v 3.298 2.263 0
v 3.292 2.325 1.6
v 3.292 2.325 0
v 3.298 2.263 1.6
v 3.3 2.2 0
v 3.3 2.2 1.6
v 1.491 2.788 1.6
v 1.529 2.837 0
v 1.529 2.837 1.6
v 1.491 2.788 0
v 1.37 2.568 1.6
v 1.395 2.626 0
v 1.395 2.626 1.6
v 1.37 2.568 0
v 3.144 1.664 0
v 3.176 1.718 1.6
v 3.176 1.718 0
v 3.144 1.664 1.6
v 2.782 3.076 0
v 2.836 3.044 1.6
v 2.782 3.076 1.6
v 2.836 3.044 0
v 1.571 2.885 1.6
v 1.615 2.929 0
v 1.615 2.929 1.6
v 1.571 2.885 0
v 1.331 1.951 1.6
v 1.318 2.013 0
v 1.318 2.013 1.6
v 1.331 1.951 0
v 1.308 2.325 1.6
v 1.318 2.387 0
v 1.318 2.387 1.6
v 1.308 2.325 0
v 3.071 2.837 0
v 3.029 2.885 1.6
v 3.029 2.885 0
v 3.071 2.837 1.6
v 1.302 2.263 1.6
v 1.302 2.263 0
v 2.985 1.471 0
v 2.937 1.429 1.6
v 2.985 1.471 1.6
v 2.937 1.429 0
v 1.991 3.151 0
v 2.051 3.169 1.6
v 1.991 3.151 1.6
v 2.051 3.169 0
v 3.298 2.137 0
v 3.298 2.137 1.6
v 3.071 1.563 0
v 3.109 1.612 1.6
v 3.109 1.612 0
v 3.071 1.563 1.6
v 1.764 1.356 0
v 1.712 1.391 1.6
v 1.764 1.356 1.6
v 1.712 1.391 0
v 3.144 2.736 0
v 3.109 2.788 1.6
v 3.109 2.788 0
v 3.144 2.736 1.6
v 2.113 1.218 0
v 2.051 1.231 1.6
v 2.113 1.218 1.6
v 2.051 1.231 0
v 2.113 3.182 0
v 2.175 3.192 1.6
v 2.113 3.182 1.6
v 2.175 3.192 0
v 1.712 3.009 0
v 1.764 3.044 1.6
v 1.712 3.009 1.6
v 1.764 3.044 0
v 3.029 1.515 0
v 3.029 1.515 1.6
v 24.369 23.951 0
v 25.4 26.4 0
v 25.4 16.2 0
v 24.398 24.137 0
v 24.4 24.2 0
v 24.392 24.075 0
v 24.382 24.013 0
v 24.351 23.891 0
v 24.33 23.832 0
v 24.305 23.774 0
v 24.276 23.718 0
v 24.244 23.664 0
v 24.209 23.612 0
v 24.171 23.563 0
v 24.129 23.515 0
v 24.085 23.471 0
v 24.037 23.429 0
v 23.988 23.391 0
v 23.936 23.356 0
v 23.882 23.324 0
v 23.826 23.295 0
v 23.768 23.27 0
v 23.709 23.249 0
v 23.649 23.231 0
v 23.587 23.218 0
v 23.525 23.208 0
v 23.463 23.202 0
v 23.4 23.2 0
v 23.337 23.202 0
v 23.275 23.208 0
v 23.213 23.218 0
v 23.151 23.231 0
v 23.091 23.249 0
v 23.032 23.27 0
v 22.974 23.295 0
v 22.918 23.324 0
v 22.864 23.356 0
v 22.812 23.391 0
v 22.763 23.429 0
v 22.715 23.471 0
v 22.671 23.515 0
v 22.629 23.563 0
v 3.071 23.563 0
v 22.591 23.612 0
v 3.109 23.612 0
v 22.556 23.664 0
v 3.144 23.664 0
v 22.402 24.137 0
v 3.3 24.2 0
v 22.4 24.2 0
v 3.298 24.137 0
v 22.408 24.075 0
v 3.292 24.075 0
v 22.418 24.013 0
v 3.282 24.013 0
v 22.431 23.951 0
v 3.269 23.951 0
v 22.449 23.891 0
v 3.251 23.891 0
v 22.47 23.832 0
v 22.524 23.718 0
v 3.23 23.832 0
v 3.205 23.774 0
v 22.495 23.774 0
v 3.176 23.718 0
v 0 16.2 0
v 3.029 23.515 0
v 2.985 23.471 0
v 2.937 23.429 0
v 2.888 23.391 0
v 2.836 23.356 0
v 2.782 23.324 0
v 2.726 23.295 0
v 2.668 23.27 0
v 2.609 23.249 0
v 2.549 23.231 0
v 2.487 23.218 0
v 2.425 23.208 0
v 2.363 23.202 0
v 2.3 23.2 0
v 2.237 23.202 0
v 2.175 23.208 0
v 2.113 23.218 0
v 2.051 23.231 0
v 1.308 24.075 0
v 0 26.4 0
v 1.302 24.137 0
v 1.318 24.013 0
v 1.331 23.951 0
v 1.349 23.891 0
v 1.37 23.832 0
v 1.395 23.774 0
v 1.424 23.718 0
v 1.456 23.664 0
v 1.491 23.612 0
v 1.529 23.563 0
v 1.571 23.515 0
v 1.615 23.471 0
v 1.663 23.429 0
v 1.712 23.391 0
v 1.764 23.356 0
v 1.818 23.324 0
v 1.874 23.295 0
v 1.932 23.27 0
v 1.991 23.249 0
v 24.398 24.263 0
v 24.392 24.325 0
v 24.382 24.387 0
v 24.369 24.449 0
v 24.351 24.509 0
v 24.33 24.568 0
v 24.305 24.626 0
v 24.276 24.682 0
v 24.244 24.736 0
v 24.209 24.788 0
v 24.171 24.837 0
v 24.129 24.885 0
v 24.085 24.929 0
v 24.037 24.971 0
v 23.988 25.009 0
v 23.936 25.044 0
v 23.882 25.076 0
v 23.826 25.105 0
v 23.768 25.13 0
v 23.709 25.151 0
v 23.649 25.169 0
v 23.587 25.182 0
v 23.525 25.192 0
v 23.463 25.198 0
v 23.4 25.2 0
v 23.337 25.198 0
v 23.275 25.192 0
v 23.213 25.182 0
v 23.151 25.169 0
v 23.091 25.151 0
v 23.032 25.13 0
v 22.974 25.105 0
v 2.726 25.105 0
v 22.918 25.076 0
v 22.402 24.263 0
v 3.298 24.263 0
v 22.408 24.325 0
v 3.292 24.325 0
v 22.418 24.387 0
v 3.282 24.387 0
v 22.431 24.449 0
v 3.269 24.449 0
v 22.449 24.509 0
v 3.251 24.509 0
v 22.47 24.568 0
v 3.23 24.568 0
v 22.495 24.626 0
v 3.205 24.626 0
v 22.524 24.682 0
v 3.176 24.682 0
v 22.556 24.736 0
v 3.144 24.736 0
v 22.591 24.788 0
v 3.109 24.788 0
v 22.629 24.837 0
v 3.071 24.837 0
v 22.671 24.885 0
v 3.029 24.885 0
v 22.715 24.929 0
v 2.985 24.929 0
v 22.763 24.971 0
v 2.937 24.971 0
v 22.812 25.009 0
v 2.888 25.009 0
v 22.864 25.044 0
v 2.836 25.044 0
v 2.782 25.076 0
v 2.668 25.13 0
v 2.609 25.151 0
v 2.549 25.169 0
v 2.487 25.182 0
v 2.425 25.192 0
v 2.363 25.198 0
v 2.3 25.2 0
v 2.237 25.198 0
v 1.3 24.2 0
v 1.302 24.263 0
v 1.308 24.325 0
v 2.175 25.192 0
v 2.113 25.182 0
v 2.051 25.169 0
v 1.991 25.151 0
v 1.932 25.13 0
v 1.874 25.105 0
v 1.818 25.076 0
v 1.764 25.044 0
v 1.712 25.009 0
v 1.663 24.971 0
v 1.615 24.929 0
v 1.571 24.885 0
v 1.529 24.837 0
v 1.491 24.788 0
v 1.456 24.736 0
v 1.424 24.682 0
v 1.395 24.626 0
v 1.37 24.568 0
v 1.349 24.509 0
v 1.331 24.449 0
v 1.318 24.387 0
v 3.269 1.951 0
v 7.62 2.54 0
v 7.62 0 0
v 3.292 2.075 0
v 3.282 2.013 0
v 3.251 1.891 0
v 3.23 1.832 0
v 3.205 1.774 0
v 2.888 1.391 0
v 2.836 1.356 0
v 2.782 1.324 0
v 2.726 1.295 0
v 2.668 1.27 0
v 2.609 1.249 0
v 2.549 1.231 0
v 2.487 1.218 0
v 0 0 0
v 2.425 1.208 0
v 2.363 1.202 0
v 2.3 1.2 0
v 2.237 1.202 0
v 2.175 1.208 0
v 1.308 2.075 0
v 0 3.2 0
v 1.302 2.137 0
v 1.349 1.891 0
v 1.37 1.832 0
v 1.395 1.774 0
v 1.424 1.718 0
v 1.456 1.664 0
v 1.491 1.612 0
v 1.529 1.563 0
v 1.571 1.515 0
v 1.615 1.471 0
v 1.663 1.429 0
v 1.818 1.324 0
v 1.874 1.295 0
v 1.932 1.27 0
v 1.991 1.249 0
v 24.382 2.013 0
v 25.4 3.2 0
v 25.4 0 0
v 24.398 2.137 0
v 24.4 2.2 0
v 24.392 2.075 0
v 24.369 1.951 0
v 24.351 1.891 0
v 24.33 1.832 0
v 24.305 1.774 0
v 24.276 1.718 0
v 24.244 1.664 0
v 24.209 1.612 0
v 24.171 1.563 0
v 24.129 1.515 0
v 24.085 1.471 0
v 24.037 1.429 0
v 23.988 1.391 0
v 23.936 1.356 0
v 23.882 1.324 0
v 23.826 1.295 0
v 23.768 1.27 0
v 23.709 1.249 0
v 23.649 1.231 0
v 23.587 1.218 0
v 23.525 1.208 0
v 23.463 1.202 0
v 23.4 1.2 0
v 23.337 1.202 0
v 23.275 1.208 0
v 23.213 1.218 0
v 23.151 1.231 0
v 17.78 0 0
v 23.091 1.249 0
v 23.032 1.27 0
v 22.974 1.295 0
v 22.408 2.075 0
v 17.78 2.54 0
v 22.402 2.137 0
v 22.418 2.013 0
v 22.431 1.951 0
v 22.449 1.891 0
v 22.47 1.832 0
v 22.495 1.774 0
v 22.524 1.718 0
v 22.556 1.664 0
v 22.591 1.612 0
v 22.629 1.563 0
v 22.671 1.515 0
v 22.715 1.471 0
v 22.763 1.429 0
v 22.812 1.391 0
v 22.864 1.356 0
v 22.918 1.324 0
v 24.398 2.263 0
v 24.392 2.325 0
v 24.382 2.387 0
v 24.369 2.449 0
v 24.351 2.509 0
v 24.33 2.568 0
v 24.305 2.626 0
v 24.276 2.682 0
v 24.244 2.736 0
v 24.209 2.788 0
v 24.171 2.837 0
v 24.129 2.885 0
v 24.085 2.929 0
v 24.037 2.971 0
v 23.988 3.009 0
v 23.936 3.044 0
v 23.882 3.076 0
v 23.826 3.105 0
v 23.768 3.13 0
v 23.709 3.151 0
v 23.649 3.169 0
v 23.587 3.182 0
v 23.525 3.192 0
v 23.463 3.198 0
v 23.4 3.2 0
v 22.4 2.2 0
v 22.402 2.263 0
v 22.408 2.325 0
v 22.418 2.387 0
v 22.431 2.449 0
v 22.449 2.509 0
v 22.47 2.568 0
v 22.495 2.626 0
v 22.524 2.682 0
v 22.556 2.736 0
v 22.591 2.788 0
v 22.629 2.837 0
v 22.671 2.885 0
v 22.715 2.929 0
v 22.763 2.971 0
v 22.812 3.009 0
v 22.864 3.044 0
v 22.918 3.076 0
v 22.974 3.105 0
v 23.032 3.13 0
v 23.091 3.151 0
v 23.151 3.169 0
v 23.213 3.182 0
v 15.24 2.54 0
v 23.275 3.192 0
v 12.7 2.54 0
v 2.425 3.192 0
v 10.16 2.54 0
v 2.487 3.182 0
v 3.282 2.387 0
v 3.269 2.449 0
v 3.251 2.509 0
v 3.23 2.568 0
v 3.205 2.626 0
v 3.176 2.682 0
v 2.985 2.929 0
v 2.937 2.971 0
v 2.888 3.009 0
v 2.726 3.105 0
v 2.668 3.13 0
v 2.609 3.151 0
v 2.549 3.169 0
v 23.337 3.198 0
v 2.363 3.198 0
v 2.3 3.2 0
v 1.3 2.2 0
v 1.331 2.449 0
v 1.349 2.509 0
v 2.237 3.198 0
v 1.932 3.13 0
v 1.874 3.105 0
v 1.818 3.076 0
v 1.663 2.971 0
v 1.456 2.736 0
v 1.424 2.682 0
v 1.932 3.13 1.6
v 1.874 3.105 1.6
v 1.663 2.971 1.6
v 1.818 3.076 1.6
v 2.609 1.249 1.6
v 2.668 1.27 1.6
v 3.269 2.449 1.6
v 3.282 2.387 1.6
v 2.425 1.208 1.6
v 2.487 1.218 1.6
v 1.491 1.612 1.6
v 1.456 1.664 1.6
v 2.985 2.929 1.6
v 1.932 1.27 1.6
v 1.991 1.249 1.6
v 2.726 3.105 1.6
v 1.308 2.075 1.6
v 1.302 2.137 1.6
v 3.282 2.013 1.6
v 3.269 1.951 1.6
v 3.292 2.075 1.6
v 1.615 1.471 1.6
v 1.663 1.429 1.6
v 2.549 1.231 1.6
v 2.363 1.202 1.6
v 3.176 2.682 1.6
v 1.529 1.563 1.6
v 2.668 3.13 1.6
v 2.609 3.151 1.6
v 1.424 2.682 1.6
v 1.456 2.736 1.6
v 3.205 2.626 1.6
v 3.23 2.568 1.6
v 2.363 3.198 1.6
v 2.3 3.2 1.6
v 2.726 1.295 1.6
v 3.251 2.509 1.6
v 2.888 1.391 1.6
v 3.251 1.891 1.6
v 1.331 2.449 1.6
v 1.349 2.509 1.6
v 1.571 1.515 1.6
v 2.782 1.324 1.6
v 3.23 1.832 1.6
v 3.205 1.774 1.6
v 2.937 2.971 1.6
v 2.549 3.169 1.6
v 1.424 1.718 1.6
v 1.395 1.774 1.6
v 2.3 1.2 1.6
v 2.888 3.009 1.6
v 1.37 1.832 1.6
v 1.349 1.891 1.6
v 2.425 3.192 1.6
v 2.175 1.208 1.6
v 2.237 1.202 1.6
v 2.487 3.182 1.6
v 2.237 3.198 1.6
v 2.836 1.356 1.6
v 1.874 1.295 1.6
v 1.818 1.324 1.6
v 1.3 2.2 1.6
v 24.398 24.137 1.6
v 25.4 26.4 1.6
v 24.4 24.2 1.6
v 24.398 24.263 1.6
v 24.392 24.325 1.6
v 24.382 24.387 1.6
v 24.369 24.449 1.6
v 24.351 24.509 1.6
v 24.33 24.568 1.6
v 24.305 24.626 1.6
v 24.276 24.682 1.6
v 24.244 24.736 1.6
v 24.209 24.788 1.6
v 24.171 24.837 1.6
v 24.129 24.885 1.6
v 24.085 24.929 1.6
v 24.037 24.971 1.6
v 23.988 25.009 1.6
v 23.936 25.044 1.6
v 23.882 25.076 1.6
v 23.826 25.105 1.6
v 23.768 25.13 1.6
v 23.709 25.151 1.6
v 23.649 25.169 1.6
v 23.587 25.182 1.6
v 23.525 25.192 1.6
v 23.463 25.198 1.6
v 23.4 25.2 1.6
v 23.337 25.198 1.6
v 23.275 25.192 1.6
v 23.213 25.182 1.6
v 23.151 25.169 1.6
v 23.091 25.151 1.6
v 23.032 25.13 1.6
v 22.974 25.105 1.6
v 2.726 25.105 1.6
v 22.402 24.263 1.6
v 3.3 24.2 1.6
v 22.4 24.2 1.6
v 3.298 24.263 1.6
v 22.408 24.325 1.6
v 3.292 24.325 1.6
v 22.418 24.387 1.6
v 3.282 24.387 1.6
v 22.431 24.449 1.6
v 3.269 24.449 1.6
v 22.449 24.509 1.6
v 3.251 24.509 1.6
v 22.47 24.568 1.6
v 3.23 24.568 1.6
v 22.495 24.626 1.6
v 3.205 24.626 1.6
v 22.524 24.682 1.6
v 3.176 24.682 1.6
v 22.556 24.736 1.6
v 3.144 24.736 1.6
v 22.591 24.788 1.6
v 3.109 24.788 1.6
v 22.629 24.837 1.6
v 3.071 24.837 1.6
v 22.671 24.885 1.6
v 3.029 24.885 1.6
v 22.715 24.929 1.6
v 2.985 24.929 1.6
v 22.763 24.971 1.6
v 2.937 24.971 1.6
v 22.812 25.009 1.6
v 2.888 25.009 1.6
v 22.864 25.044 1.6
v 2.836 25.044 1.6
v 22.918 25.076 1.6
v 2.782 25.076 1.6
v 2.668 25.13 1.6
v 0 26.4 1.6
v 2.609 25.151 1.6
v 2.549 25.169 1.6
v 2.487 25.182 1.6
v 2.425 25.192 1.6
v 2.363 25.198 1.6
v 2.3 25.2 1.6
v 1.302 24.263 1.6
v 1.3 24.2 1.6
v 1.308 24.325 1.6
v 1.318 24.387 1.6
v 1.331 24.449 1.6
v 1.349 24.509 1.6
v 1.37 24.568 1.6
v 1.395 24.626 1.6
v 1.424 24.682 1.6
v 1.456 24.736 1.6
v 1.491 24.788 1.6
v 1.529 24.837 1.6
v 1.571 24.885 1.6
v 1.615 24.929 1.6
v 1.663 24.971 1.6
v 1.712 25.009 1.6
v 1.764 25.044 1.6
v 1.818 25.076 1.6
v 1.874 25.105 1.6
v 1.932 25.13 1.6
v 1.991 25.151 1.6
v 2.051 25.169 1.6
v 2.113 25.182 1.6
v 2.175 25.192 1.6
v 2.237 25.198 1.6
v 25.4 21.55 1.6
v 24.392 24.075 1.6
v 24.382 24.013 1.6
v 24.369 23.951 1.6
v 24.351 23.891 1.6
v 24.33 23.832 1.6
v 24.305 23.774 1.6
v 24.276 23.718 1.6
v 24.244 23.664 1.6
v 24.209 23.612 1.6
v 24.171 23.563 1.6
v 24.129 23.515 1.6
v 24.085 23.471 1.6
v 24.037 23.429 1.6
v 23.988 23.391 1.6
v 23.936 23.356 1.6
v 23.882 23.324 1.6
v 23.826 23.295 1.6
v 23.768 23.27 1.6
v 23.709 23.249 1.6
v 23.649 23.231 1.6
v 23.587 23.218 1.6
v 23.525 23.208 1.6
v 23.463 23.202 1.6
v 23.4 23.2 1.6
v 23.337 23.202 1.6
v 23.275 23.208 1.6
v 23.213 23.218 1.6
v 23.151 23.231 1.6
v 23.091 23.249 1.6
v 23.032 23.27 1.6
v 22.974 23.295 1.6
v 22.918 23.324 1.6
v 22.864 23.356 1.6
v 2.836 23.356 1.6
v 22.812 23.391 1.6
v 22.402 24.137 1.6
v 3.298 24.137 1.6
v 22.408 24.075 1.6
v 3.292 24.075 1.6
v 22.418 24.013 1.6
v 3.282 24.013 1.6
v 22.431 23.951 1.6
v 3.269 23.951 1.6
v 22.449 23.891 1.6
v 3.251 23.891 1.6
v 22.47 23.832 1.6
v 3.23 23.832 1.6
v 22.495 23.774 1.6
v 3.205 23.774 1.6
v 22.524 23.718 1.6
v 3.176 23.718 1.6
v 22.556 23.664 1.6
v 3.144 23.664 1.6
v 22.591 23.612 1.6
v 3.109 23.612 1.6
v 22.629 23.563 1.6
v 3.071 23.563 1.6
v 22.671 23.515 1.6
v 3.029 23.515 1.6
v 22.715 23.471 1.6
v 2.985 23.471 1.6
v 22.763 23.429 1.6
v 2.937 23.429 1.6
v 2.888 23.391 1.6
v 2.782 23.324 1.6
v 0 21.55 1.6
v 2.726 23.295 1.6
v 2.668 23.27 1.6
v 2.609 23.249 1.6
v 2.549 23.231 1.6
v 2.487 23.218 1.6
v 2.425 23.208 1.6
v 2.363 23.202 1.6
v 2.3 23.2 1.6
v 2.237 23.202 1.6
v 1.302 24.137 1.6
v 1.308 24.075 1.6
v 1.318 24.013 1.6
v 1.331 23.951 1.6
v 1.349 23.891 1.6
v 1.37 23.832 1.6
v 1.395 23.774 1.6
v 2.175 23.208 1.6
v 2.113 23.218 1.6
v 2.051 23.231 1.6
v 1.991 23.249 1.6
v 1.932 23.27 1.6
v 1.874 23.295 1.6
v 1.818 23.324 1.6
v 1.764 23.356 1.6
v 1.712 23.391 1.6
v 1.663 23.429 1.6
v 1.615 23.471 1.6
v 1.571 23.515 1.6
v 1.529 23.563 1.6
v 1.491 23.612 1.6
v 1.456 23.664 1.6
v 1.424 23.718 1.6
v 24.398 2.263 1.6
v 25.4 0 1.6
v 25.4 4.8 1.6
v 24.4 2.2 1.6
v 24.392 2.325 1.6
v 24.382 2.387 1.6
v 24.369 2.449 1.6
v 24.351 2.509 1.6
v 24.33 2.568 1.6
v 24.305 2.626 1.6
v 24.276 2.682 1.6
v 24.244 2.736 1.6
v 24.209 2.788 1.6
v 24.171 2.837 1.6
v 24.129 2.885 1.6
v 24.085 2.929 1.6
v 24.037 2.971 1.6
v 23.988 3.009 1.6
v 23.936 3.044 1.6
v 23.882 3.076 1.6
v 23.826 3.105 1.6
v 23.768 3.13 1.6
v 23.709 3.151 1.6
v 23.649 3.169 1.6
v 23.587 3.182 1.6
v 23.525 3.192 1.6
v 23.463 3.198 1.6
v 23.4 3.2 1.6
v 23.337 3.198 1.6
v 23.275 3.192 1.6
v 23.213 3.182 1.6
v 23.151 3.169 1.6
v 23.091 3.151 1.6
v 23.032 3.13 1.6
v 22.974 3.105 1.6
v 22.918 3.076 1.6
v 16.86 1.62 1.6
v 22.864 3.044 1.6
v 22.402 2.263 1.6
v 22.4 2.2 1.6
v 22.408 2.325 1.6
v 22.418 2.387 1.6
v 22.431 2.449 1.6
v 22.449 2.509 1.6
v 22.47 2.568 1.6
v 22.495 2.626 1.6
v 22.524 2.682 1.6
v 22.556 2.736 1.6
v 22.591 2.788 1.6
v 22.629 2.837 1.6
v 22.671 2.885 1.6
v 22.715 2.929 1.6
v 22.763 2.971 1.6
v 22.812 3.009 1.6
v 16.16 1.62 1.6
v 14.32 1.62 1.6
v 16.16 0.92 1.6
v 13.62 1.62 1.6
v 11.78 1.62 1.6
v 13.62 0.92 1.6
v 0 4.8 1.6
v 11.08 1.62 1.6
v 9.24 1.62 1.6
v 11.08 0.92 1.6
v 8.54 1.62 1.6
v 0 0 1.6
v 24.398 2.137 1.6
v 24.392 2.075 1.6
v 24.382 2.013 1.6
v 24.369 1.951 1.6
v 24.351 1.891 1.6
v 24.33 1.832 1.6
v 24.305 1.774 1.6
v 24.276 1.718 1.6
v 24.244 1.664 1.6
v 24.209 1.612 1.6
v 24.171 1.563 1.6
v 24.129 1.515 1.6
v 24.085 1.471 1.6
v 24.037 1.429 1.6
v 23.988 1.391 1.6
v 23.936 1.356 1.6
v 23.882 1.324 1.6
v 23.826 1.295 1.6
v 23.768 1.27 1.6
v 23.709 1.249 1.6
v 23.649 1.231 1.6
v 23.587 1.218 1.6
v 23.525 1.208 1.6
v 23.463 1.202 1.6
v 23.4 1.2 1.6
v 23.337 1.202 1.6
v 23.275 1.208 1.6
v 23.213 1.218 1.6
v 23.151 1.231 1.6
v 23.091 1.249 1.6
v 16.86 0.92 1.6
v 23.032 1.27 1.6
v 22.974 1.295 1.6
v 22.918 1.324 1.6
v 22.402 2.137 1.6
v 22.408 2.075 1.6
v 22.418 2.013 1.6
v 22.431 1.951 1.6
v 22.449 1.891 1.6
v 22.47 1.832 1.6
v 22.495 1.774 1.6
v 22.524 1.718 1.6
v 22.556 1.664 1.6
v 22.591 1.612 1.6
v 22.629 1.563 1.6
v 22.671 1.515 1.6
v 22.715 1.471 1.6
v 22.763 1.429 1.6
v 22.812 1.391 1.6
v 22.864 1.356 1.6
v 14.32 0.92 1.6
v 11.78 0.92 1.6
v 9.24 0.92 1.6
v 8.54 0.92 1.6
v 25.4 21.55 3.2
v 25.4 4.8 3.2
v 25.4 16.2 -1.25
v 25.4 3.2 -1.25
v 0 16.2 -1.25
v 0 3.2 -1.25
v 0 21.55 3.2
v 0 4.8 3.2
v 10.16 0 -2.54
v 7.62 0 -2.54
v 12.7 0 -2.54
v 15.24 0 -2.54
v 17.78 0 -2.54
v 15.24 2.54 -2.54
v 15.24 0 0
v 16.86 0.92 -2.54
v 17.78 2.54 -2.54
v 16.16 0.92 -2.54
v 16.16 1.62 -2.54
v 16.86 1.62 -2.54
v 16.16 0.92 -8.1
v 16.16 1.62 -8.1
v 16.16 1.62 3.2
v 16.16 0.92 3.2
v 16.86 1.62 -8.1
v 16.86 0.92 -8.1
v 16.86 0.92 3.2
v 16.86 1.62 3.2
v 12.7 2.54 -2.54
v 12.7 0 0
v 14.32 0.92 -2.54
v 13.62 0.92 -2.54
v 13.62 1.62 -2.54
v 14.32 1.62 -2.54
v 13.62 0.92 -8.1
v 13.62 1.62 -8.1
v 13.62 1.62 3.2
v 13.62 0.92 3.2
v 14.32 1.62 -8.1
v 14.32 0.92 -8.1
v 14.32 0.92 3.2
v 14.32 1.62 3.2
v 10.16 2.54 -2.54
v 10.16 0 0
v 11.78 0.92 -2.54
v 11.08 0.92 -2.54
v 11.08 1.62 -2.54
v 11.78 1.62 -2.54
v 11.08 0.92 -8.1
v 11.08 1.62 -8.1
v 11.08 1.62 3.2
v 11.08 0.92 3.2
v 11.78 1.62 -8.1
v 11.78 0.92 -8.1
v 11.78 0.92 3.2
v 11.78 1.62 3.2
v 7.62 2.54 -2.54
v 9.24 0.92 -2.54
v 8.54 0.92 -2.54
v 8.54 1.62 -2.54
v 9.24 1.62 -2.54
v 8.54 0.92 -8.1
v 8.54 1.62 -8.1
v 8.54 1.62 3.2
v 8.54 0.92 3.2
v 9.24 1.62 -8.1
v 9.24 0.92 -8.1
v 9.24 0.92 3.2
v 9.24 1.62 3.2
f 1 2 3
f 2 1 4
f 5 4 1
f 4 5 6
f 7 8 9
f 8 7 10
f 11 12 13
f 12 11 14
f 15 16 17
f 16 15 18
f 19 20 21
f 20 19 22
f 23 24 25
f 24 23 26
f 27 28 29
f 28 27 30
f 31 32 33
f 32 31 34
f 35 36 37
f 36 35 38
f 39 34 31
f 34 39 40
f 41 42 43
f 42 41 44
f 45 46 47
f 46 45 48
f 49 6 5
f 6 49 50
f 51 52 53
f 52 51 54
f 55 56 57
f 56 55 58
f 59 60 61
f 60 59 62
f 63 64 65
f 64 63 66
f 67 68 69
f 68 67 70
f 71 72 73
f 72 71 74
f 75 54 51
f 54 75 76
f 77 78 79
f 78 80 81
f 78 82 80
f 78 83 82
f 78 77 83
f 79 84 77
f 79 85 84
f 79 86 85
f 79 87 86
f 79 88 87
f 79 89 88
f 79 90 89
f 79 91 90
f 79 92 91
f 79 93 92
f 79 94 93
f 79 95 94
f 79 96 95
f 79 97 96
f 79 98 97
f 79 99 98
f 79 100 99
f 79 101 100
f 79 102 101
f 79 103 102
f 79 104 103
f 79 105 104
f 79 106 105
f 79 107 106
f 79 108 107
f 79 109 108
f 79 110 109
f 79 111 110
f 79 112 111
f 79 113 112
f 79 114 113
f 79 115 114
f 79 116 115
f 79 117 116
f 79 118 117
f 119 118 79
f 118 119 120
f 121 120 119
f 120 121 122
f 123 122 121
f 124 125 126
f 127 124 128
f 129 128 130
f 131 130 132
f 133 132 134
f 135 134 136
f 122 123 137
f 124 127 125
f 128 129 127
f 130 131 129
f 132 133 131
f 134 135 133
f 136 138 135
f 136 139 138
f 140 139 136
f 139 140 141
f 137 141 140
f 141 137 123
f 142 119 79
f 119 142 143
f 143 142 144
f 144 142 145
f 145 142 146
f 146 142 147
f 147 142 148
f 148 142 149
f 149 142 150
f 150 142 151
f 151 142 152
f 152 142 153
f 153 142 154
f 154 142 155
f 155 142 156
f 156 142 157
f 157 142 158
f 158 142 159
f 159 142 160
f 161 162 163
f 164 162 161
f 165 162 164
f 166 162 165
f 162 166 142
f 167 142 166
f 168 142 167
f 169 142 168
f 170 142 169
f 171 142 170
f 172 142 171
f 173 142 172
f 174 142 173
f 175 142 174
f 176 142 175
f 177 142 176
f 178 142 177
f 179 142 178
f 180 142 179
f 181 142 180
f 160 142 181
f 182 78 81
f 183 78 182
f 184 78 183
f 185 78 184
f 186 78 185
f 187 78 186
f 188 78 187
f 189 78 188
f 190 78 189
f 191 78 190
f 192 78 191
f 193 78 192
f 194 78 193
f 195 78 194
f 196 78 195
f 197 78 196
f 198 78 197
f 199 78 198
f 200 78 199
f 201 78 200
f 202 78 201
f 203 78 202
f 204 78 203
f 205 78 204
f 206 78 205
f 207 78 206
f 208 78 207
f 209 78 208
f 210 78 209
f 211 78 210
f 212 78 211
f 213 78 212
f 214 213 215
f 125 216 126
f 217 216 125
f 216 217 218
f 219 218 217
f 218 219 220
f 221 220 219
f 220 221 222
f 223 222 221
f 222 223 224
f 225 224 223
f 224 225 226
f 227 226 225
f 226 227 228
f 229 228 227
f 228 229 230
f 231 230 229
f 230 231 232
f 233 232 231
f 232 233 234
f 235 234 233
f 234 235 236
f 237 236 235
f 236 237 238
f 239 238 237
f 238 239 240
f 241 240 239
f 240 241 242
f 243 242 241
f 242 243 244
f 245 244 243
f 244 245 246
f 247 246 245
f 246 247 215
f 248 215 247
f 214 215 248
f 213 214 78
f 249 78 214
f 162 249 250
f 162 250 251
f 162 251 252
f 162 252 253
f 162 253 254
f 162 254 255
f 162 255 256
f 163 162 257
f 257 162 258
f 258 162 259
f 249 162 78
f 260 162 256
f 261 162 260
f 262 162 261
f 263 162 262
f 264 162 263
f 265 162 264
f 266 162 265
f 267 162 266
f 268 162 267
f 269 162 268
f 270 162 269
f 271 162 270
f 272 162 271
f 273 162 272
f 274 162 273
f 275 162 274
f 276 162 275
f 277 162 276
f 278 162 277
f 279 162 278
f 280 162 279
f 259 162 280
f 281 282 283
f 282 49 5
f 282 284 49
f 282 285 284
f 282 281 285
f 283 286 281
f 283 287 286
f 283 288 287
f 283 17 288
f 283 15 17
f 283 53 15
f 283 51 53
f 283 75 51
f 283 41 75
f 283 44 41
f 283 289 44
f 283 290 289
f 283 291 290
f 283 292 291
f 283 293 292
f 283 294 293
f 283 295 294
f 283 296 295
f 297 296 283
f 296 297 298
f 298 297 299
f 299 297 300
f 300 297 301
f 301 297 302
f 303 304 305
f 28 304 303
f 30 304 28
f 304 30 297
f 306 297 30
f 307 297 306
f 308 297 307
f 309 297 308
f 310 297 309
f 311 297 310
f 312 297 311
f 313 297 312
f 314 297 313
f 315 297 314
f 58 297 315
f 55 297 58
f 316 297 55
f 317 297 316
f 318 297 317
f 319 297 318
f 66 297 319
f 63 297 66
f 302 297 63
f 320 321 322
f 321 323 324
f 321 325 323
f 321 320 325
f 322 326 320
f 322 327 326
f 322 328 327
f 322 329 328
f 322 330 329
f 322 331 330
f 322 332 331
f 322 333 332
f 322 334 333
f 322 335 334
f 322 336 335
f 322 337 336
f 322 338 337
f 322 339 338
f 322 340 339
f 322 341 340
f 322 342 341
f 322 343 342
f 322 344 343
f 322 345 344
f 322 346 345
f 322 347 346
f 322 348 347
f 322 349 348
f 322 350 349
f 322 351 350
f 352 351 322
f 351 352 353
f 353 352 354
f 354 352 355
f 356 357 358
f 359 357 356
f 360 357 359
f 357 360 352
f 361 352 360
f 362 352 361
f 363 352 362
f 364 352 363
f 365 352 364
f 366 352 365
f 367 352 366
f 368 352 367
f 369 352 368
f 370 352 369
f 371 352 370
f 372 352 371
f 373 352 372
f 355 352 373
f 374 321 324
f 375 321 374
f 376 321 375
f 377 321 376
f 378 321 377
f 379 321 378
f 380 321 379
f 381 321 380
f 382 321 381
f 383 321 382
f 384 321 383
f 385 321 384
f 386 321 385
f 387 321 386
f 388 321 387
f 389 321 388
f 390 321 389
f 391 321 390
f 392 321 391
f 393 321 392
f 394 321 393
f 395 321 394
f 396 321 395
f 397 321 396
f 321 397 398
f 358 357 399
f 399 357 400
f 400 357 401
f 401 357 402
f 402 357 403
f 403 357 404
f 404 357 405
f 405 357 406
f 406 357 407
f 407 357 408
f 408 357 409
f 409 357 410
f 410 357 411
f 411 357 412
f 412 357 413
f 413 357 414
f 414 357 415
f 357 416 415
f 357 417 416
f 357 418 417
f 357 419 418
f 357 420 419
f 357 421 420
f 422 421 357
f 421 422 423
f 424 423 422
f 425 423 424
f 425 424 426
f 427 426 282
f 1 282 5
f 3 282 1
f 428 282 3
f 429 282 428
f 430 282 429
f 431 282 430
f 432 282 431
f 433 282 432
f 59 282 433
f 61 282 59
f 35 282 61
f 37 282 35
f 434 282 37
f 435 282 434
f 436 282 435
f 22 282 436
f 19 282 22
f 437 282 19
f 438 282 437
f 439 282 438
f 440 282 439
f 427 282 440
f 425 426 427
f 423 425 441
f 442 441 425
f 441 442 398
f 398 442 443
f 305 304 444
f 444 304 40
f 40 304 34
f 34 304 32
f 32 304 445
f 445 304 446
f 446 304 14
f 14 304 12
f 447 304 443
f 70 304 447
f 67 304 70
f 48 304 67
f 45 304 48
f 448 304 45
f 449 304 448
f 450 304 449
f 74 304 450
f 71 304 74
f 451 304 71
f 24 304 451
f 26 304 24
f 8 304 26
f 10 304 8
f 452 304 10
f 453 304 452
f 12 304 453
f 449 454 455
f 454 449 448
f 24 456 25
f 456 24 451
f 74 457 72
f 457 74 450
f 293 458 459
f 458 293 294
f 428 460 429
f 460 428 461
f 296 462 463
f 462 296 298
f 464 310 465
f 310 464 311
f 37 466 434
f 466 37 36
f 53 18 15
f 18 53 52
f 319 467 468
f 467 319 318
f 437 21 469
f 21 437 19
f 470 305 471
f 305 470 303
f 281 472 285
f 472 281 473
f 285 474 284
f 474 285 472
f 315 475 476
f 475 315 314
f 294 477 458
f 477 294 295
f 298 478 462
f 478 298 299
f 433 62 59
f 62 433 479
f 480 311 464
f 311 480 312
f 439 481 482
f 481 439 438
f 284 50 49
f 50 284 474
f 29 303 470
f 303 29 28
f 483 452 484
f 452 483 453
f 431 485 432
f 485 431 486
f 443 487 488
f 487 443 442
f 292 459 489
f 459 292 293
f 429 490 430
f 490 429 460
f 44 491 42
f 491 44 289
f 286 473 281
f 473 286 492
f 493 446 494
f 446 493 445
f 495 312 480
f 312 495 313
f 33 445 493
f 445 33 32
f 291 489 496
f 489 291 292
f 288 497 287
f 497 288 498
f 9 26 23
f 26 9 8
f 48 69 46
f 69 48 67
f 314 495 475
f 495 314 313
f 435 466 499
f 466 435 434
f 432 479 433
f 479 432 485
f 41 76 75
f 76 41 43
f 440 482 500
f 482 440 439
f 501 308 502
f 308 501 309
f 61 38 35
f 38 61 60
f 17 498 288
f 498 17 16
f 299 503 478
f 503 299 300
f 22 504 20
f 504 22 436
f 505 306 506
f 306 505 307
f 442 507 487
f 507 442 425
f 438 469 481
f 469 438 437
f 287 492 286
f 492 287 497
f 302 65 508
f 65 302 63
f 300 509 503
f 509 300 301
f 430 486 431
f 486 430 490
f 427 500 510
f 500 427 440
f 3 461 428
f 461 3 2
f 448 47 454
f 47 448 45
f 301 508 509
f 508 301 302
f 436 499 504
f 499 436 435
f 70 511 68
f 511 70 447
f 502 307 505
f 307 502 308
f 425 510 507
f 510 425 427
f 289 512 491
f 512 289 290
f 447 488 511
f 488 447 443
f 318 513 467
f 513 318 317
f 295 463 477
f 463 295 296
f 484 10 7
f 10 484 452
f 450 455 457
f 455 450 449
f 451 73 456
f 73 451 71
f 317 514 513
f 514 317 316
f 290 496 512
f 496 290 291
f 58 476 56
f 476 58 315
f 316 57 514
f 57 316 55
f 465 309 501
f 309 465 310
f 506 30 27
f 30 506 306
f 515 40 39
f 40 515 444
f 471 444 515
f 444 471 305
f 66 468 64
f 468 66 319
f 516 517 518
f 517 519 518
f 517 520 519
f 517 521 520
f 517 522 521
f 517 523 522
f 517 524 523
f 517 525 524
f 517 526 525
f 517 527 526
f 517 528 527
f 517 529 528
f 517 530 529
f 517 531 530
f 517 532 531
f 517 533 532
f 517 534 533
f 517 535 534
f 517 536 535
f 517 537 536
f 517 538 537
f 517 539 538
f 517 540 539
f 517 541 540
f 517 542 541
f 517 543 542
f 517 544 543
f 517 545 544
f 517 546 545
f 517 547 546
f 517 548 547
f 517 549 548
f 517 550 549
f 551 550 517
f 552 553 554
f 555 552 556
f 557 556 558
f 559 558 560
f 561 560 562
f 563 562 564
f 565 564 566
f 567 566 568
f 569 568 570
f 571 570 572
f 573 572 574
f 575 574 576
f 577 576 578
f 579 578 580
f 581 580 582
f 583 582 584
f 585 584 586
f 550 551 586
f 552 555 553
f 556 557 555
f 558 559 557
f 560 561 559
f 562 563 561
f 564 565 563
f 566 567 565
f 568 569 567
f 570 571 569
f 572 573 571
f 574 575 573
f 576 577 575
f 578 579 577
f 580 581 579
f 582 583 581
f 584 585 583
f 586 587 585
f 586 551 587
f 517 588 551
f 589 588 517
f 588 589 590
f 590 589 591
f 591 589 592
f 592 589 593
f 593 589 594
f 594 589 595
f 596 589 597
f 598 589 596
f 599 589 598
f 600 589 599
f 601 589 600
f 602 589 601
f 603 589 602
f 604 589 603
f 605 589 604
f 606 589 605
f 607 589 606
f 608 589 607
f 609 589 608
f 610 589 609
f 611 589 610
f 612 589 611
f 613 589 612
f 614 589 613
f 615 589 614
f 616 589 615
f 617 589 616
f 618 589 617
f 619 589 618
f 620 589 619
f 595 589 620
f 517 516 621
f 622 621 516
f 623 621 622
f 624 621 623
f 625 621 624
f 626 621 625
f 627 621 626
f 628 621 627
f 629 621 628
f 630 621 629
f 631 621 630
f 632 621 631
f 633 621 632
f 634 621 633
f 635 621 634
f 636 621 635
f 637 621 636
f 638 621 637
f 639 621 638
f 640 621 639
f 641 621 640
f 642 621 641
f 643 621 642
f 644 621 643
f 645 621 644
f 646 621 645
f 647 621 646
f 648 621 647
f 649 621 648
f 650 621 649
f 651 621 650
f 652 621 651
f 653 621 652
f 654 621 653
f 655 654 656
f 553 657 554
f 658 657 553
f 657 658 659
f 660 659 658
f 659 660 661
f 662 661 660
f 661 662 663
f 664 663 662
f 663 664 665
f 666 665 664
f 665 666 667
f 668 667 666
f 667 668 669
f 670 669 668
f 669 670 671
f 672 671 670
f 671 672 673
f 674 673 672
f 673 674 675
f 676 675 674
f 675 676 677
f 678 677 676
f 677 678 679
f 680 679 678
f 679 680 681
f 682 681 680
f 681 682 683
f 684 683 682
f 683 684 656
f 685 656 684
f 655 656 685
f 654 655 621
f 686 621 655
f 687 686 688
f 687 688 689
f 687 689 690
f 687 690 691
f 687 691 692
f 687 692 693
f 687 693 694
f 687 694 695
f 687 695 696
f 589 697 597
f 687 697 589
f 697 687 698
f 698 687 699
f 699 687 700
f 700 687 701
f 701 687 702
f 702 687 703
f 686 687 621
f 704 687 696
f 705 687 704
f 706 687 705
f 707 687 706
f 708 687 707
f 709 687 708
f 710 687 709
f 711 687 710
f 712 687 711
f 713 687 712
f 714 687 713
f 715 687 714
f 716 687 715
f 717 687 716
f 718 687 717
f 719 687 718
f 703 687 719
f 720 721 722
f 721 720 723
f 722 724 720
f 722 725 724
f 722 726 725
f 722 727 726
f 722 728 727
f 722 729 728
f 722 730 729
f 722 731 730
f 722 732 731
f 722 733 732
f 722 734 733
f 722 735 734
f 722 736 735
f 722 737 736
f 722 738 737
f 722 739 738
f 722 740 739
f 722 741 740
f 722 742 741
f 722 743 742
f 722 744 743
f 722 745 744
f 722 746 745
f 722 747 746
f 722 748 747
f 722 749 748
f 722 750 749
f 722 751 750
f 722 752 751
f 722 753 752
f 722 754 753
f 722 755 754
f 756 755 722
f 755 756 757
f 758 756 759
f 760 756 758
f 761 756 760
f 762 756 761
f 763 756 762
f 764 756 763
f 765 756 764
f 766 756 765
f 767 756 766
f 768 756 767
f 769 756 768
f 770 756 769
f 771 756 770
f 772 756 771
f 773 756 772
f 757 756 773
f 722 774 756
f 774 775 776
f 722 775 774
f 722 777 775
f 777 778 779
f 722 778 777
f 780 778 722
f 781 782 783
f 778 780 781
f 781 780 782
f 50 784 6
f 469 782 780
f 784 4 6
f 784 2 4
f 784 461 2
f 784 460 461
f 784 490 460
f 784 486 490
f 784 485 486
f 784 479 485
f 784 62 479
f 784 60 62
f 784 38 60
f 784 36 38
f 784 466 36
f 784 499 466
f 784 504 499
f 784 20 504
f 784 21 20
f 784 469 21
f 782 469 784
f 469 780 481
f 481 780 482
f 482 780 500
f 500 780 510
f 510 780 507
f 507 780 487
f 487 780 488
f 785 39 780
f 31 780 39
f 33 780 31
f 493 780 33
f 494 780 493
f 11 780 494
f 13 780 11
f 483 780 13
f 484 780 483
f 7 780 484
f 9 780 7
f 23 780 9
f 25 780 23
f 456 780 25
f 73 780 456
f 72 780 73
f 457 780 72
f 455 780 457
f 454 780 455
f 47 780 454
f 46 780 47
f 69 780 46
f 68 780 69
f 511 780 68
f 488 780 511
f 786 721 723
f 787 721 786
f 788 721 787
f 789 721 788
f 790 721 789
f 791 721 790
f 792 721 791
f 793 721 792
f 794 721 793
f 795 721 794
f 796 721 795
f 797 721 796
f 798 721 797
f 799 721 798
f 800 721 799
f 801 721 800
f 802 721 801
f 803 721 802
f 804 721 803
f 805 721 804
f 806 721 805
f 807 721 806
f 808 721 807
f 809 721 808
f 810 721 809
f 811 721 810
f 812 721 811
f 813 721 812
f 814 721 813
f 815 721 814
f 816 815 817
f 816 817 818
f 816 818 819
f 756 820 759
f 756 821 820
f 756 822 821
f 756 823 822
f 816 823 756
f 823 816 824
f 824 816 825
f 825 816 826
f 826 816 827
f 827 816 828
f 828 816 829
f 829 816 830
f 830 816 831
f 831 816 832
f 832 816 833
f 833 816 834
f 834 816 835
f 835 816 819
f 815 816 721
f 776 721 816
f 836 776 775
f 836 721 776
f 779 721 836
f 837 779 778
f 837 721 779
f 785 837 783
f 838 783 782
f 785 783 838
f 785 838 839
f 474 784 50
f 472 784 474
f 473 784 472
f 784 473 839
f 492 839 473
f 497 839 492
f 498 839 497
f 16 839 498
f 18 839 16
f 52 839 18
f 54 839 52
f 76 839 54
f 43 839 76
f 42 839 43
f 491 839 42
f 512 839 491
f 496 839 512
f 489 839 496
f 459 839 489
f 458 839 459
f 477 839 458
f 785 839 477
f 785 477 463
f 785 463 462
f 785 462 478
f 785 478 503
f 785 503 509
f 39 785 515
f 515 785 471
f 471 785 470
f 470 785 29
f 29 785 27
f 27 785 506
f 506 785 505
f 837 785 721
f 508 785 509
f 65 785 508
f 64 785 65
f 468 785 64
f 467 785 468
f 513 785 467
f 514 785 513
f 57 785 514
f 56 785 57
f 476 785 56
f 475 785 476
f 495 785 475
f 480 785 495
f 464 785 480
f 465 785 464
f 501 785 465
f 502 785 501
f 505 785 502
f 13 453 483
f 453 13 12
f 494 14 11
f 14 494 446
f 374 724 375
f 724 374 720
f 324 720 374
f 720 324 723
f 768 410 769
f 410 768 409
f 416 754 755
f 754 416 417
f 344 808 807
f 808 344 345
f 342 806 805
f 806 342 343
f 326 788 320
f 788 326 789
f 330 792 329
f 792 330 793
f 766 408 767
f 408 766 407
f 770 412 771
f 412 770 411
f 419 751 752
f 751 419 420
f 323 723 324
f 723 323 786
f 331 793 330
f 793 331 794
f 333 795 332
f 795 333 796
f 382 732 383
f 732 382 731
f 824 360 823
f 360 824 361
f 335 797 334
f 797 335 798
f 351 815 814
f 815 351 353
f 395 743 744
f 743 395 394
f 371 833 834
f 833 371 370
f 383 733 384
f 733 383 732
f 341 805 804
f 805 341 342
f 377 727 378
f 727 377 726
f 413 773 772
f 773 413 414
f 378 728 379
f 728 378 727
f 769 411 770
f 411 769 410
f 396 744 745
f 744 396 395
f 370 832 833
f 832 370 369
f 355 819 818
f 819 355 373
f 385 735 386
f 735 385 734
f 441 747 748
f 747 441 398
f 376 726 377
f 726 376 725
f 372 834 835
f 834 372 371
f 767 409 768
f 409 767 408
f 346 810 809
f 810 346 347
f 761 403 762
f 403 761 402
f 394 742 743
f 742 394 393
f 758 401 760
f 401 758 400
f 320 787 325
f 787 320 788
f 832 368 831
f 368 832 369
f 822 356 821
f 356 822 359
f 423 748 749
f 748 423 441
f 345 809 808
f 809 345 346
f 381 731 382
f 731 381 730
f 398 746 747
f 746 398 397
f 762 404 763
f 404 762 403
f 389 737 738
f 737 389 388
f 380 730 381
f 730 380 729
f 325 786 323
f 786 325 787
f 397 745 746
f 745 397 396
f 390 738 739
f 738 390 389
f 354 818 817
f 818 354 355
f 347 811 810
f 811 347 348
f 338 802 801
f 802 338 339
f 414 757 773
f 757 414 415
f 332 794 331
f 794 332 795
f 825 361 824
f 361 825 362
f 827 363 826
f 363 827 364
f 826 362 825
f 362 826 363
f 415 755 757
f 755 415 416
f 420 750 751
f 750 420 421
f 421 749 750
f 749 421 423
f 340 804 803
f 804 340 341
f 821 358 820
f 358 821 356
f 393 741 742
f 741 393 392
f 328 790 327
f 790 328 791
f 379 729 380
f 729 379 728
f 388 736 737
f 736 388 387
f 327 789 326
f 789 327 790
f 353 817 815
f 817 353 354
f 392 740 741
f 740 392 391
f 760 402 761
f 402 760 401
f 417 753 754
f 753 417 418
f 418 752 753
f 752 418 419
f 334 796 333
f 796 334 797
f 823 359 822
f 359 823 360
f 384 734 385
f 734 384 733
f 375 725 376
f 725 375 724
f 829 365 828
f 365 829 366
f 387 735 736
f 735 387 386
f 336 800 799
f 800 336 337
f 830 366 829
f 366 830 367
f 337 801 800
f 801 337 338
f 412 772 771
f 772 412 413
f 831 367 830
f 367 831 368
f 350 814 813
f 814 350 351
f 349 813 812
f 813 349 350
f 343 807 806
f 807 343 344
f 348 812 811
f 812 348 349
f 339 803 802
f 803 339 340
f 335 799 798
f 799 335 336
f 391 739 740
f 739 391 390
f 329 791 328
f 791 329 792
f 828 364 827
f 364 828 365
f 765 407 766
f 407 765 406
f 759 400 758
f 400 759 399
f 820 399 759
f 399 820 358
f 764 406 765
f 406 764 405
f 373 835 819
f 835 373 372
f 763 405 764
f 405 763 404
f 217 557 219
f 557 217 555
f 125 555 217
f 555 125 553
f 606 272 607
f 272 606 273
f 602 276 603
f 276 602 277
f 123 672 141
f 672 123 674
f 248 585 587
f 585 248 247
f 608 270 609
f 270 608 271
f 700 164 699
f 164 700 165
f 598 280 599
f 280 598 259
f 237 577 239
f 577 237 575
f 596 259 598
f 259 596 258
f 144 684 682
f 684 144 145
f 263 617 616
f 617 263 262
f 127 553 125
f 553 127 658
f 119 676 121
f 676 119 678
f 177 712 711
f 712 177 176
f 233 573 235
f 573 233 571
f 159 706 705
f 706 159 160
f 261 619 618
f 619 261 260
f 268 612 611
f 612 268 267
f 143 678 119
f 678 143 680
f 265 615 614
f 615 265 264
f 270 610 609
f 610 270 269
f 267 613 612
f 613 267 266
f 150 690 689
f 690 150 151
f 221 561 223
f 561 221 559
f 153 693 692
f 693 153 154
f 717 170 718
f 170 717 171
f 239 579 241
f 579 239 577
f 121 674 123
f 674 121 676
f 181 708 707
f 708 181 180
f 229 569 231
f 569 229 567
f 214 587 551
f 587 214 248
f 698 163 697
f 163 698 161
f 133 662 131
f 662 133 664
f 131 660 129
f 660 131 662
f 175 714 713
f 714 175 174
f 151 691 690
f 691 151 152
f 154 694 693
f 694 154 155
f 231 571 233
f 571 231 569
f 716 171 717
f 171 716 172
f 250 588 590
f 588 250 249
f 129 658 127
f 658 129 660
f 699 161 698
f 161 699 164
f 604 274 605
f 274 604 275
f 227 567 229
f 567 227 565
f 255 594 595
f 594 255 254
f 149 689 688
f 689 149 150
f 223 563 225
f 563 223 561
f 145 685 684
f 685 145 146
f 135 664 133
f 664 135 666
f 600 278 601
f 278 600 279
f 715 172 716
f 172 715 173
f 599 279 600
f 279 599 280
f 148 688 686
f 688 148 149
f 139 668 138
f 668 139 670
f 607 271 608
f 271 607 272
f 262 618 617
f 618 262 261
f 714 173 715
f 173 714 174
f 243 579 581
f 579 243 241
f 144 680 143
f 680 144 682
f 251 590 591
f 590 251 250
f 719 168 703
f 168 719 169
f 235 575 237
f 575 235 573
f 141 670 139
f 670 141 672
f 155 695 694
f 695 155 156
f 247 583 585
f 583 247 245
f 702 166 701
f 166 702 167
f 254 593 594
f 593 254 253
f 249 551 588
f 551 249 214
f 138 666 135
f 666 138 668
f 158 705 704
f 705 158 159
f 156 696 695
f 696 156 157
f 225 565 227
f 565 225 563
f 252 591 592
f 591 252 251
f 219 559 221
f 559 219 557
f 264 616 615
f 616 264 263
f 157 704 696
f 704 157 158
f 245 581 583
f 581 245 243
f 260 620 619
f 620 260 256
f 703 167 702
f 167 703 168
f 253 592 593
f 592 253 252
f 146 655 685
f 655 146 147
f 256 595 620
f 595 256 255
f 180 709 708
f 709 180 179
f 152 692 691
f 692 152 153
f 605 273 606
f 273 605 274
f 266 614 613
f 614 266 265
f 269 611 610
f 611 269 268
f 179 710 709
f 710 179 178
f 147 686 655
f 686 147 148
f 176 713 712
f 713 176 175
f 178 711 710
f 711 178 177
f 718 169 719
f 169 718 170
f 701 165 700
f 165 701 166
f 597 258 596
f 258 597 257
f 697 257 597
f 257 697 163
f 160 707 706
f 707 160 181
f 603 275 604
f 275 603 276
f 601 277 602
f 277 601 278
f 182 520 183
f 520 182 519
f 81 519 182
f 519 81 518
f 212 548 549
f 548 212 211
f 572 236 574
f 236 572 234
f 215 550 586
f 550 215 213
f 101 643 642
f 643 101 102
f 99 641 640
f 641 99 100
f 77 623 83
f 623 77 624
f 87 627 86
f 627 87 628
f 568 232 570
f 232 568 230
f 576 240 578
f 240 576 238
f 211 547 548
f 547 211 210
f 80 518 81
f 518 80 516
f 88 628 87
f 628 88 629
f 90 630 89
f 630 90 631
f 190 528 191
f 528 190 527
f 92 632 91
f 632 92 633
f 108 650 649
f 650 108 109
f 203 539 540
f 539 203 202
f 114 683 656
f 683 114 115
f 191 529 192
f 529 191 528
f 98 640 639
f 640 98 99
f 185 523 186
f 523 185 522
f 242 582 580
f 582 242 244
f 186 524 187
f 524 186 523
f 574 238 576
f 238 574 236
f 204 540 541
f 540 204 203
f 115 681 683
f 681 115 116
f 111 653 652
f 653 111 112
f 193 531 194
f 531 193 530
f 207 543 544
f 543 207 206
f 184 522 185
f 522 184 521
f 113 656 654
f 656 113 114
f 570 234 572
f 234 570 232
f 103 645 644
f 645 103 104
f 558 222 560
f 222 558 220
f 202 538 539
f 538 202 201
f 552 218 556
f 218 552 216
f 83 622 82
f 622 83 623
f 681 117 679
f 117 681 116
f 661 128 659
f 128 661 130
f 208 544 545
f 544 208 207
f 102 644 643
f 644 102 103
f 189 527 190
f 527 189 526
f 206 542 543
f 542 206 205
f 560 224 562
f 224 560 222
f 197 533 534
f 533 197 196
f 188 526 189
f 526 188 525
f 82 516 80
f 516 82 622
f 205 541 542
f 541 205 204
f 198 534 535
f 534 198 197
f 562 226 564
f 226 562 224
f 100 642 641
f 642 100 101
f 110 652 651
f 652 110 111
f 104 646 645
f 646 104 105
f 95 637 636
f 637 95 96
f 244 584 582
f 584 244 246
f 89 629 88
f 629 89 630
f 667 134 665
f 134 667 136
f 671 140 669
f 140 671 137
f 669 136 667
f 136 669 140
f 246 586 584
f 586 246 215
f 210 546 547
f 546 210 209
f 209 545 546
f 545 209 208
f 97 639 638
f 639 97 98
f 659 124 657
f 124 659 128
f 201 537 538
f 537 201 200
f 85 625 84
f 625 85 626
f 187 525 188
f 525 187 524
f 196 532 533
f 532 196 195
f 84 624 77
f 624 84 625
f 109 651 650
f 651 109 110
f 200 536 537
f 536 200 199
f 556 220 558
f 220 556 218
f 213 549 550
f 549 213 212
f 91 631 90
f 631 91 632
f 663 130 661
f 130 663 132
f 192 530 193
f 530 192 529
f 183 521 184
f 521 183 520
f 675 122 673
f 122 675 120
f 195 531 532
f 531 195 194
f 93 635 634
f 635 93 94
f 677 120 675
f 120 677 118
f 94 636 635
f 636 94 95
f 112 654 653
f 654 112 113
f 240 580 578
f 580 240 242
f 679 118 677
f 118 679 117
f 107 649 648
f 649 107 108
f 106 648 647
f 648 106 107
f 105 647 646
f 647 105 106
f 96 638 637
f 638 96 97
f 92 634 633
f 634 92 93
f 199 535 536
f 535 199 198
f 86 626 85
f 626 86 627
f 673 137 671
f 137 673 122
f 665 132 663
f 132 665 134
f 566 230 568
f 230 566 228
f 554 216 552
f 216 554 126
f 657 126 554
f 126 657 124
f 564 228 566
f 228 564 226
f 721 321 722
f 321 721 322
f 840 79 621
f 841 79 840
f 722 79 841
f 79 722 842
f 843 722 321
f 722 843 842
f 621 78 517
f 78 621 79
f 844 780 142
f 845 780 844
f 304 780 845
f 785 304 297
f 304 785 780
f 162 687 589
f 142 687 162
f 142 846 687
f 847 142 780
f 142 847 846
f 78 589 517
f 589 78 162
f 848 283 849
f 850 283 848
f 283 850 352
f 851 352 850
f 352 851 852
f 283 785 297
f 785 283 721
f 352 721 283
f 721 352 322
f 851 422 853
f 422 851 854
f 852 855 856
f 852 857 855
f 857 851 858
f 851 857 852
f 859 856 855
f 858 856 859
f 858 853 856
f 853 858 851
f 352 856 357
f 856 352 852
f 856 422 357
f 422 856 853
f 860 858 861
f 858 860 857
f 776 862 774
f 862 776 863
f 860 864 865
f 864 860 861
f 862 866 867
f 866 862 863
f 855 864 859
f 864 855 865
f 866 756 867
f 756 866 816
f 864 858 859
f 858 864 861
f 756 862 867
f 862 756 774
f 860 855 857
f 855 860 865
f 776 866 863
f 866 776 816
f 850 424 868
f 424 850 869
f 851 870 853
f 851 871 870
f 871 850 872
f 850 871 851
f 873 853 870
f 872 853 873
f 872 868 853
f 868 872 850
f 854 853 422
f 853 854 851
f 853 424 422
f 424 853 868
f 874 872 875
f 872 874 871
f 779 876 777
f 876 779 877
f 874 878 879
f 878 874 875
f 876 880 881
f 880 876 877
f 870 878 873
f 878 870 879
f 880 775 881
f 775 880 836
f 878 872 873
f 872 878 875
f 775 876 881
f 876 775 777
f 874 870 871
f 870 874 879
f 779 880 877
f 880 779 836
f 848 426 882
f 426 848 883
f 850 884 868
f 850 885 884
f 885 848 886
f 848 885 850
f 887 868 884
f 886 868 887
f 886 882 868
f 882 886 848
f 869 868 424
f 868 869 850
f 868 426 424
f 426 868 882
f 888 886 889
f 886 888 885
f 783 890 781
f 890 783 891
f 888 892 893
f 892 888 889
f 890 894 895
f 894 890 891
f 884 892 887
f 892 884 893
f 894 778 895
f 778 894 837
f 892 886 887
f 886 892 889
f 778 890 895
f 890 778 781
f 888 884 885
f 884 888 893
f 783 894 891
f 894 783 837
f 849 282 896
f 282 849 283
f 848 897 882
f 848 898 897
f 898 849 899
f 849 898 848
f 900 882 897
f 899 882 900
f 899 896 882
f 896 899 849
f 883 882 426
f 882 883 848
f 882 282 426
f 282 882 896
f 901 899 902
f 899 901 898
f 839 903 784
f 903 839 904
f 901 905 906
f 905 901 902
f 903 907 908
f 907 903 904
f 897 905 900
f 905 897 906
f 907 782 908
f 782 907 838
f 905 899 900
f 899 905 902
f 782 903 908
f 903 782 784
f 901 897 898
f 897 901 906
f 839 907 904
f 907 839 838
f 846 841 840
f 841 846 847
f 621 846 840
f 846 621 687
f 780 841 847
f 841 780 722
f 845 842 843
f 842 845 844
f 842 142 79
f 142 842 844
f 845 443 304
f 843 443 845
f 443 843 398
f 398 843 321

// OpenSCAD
// file: pins.scad
pin_f_width = 2.54;
pin_f_thickness = 0.8;
pin_header_depth = 11.9;


pin_m_width = 0.7;
pin_m_length = 11.3;
pin_m_inset = (pin_f_width - pin_m_width) / 2;
pin_m_insulation_inset = 3.2;


module m_pin(pin_length=pin_m_length, insulation_inset=pin_m_insulation_inset) {
    cube([pin_f_width, pin_f_width, pin_f_width]);
    translate([pin_m_inset, pin_m_inset, -insulation_inset])
    cube([pin_m_width, pin_m_width, pin_length]);
}

module m_pins(pins, pin_length=pin_m_length, insulation_inset=pin_m_insulation_inset) {
    for (i = [0: pin_f_width: pin_f_width * (pins - 1)]) {
	translate([i, 0, 0])m_pin(pin_length, insulation_inset);
    }
}

module pin_header(pins) {
    for (i = [0: pin_f_width: pin_f_width * (pins - 1)]) {
	translate([i, 0, 0])cube([pin_f_width, pin_f_width, pin_header_depth]);
    }
}


//m_pins(5);
//pin_header(4);
// main file
include <pins.scad>


ssd1306_board_width = 25.4;
ssd1306_board_depth = 26.4;
ssd1306_board_height = 1.6;

ssd1306_display_height = 16.75;
ssd1306_display_thickness = 1.6;
ssd1306_display_y_offset = 4.8;

ssd1306_hole_diameter = 2;
ssd1306_hole_inset_x_a = 1.3;
ssd1306_hole_inset_x_b = 1;
ssd1306_hole_inset_y = 1.2;

ssd1306_pin_width = pin_f_width * 4;
ssd1306_pin_x = (ssd1306_board_width - ssd1306_pin_width) / 2;

ssd1306_component_height = 1.25;
ssd1306_component_y_offset = ssd1306_hole_inset_y + ssd1306_hole_diameter;
ssd1306_component_depth = 13;


module ssd1603_board() {
    difference() {
        cube([ssd1306_board_width, ssd1306_board_depth, ssd1306_board_height]);
	ssd1306_holes();
    }
}

module ssd1306_display() {
    cube([ssd1306_board_width, ssd1306_display_height, ssd1306_display_thickness]);
}

module ssd1306_hole() {
    cylinder(d=ssd1306_hole_diameter, h=ssd1306_board_height, $fn=100);
}

module ssd1306_components() {
    cube([ssd1306_board_width, ssd1306_component_depth, ssd1306_component_height]);
}

module ssd1306_holes() {
    translate([ssd1306_hole_diameter / 2, ssd1306_hole_diameter / 2, 0]) {
	for (y = [ssd1306_hole_inset_y, ssd1306_board_depth - ssd1306_hole_diameter - ssd1306_hole_inset_y]) {
	    translate([ssd1306_hole_inset_x_a, y, 0])
	    ssd1306_hole();
	    translate([ssd1306_board_width - ssd1306_hole_diameter - ssd1306_hole_inset_x_b, y, 0])
	    ssd1306_hole();
	}
    }
}


module ssd1306() {
    ssd1603_board();
    translate([0, ssd1306_display_y_offset, ssd1306_board_height]) 
    ssd1306_display();

    translate([ssd1306_board_width - ssd1306_pin_x, 0, 0])
    rotate([0, 180, 0])
    m_pins(4);

    translate([0, ssd1306_component_y_offset, -ssd1306_component_height])
    ssd1306_components();
}

ssd1306();
